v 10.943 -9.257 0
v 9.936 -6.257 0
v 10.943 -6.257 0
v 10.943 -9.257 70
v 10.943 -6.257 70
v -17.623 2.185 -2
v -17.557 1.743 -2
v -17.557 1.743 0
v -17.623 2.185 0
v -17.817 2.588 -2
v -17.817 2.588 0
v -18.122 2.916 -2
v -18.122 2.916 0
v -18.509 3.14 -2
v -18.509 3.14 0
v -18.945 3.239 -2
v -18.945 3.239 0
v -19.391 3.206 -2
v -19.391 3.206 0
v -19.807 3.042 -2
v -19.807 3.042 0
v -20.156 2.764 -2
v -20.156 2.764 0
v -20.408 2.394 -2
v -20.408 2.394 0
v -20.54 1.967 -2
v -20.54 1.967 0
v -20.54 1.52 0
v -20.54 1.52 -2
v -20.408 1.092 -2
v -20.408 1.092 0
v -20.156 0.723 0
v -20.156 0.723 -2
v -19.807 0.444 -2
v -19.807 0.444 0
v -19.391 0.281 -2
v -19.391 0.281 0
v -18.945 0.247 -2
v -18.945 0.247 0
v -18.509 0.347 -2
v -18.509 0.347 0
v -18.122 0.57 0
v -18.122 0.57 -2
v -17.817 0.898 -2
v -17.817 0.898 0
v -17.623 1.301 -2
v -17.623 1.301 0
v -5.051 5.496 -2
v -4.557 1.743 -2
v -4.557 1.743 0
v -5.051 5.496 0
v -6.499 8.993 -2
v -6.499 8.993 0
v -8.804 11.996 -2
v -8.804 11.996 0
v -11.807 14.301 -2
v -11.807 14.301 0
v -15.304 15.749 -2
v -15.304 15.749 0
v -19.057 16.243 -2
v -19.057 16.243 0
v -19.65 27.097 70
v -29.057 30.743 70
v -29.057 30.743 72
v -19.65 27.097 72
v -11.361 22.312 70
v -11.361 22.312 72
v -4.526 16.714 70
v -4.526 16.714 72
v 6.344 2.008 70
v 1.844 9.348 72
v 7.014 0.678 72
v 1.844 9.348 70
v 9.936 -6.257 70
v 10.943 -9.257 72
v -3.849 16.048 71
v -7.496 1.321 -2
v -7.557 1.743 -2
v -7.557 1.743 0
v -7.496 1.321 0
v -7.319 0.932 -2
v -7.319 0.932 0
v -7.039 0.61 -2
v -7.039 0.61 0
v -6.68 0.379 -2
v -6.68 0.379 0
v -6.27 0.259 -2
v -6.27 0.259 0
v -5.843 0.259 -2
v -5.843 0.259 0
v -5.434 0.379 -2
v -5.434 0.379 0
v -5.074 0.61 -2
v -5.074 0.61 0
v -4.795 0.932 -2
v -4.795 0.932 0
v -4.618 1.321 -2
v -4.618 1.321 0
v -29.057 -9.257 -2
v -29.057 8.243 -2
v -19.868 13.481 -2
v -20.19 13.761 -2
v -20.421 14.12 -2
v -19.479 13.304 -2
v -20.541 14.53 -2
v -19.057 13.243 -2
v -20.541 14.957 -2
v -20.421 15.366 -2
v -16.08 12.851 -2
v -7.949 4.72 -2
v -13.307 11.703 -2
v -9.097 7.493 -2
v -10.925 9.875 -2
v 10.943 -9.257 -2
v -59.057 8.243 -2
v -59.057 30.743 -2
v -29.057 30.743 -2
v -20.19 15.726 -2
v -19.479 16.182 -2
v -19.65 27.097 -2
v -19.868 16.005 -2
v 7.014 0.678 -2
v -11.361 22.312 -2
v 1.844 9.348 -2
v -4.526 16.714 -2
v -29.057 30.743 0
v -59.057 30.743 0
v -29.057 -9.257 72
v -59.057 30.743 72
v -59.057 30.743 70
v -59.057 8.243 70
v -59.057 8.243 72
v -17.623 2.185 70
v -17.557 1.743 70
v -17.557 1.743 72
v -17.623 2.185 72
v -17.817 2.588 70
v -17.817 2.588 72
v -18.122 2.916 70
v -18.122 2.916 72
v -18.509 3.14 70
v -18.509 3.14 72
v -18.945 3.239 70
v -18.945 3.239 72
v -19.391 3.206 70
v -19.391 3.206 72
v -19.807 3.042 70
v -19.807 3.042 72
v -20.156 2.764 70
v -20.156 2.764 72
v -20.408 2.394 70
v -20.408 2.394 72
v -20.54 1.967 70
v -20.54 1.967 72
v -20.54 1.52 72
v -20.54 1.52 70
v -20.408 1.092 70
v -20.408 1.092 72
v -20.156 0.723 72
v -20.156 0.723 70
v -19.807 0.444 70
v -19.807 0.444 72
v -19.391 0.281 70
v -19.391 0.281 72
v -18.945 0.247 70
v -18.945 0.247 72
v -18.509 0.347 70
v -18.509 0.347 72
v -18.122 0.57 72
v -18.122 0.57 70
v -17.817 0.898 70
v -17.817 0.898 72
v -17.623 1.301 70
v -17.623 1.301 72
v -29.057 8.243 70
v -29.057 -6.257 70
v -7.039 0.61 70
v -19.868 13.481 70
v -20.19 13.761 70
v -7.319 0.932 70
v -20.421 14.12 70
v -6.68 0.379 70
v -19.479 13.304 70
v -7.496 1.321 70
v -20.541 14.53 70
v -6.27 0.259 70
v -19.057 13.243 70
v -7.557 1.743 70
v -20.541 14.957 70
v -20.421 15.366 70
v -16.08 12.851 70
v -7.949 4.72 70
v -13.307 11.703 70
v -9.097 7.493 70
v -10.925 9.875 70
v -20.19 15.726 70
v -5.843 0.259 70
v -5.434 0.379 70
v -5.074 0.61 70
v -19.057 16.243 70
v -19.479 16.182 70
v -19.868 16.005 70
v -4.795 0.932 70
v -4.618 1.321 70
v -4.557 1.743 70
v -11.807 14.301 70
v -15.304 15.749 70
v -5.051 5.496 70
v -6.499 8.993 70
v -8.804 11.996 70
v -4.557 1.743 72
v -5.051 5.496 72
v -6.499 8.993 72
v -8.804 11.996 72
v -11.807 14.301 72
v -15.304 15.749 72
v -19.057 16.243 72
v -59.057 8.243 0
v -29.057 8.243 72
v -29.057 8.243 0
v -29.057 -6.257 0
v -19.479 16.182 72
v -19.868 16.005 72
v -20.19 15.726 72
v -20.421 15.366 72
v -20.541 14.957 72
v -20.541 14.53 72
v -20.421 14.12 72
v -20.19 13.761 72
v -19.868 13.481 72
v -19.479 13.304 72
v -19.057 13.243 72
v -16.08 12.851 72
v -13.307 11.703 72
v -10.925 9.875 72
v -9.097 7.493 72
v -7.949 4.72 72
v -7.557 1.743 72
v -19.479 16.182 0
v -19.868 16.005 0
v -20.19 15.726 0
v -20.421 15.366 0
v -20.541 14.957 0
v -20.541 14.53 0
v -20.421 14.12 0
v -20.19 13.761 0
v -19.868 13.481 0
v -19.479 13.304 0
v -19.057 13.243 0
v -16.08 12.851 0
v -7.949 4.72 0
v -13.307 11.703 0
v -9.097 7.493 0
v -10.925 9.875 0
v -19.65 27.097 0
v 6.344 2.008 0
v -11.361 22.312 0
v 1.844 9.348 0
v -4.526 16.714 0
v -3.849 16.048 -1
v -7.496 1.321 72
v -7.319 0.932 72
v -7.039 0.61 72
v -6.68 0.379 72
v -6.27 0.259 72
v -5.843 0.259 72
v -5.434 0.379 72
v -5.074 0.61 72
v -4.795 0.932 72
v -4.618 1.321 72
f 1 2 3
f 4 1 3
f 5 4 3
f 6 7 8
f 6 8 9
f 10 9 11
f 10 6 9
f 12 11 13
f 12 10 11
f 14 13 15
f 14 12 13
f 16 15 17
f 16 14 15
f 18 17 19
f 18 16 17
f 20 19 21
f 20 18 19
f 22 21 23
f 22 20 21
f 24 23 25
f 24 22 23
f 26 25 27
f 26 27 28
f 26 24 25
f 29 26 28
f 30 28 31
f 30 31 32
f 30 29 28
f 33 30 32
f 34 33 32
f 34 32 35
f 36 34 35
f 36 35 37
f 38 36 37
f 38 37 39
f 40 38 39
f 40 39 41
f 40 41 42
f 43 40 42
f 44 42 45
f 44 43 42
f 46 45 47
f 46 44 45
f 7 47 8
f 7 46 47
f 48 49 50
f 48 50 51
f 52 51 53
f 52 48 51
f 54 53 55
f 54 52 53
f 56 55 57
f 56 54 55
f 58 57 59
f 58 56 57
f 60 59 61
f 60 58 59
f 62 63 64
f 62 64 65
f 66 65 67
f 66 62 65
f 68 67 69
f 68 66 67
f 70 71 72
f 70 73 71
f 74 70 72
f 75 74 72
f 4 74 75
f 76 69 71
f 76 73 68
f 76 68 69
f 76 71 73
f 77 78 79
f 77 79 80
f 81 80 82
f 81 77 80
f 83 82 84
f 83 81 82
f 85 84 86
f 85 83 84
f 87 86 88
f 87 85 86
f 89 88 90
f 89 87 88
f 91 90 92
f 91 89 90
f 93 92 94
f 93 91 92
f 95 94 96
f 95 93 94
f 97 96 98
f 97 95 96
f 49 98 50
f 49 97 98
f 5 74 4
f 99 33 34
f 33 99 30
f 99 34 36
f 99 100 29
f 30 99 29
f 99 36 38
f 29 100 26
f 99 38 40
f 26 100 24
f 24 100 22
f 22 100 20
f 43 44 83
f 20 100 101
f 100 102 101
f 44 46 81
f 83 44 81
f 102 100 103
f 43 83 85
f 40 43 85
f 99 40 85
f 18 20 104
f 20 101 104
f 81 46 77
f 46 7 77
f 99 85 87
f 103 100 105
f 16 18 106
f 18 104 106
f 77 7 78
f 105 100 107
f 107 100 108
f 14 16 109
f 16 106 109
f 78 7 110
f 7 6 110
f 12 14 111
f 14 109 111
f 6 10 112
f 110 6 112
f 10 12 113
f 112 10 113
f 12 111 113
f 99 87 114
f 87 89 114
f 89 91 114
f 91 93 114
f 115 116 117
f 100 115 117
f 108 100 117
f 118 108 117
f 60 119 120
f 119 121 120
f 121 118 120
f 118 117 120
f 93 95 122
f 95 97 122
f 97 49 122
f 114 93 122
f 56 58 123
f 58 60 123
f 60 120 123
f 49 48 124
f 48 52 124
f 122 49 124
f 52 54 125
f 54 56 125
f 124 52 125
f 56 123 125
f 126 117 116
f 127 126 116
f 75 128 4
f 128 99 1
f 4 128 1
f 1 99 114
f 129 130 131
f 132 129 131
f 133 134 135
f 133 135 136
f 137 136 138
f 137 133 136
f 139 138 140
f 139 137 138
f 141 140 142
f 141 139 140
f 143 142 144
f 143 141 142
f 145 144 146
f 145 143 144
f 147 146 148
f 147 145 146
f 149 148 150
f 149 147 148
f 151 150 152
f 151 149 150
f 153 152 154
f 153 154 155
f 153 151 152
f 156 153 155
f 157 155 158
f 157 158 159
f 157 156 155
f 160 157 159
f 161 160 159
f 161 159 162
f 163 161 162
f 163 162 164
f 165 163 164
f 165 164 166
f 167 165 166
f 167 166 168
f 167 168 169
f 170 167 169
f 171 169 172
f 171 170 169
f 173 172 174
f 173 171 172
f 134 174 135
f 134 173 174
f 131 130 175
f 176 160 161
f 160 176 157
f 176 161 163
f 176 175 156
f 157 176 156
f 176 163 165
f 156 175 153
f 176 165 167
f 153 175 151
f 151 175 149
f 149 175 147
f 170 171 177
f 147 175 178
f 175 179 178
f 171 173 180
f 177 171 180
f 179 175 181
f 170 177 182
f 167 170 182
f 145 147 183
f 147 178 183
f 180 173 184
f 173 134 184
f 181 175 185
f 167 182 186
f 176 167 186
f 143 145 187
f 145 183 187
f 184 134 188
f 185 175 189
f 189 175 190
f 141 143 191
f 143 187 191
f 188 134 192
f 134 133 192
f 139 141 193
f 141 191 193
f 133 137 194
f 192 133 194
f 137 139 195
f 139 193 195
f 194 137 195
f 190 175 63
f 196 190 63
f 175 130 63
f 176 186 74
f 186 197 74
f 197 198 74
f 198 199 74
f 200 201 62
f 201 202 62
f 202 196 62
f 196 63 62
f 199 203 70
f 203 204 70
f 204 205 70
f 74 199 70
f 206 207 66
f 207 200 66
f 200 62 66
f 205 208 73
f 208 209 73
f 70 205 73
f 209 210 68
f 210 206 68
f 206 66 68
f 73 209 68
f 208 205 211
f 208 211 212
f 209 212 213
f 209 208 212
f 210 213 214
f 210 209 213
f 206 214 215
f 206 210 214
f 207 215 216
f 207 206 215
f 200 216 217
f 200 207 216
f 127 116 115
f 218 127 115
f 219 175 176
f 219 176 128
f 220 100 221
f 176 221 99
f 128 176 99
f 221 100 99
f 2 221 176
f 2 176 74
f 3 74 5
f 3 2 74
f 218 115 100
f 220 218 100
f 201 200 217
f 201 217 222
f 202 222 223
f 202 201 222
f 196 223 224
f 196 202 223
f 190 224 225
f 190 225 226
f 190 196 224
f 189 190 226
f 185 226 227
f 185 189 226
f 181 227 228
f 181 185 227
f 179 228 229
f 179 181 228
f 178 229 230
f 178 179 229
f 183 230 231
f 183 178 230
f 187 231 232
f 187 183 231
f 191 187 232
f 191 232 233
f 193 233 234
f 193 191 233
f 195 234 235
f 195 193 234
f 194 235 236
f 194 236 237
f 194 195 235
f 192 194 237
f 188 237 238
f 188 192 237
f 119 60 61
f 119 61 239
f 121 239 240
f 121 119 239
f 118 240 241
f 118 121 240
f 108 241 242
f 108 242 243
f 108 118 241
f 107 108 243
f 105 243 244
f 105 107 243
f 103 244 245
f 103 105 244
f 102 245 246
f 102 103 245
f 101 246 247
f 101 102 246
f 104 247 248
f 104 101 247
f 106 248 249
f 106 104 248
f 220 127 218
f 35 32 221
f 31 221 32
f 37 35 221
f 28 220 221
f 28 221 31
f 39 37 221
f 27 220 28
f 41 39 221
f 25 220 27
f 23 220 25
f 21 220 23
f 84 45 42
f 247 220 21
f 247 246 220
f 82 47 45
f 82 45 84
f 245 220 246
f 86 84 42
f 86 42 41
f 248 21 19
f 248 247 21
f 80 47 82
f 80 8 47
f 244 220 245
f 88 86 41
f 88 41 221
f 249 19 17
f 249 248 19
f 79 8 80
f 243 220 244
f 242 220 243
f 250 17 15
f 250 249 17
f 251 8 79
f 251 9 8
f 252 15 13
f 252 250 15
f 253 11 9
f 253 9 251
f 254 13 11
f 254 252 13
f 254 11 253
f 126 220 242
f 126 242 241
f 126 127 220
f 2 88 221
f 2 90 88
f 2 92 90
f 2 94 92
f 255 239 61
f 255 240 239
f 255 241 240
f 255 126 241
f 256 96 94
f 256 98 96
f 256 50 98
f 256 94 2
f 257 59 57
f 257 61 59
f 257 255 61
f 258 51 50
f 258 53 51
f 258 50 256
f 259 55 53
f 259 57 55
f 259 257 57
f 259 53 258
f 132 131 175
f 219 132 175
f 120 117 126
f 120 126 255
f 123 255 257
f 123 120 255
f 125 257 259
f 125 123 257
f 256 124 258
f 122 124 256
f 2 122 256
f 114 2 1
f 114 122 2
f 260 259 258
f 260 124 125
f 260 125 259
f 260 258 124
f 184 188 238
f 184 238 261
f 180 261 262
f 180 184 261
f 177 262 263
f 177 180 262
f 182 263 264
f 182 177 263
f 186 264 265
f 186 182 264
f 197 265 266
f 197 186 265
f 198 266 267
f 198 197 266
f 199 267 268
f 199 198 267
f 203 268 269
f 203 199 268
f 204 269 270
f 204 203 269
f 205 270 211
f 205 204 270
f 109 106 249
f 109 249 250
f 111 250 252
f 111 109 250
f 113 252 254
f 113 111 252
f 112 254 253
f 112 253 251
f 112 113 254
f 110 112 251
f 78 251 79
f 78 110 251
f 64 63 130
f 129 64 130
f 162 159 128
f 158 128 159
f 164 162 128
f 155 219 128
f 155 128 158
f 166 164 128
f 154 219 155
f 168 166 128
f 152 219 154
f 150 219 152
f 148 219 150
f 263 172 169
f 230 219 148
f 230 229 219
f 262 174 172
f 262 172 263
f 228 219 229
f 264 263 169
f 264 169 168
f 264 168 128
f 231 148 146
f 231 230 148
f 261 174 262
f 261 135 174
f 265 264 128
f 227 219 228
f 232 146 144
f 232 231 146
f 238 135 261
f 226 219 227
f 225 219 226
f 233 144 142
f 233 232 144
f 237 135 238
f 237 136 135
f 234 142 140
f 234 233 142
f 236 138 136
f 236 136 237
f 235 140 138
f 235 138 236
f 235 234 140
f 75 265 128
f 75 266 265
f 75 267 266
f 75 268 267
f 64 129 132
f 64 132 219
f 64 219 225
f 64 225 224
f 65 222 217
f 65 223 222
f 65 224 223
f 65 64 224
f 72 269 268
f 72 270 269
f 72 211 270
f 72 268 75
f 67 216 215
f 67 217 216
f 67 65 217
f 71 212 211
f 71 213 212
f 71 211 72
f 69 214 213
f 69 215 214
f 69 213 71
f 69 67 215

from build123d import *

# Parameters (mm, degrees)
ESQUISSE1_W                = 40
ESQUISSE1_H                = 3
BOSS_EXTRU_2_DEPTH         = 70
ESQUISSE3_R                = 1.5
BOSS_EXTRU_3_DEPTH         = 2
R_P_TITION_LIN_AIRE1_COUNT = 2
R_P_TITION_LIN_AIRE1_PITCH = 72


with BuildPart() as part:
    # Esquisse1 → Boss.-Extru.2 (new body)
    with BuildSketch(Plane.XY):
        with Locations((-9.056759605, -7.756756757)):
            Rectangle(ESQUISSE1_W, ESQUISSE1_H)
    extrude(amount=BOSS_EXTRU_2_DEPTH)

    # Esquisse3 → Boss.-Extru.3 (add)
    with BuildSketch(Plane.XY.offset(70)):
        with BuildLine():
            Line((-29.056759605, -9.256756757), (10.943240395, -9.256756757))
            add(Edge.make_bspline(
                [(-29.056759605, 30.743243243), (1.359242572, 21.353115069), (10.943240395, -9.256756757)],
                knots=[0, 0, 0, 1, 1, 1], degree=2))
            Line((-29.056759605, 30.743243243), (-59.056759605, 30.743243243))
            Line((-59.056759605, 30.743243243), (-59.056759605, 8.243243243))
            Line((-59.056759605, 8.243243243), (-29.056759605, 8.243243243))
            Line((-29.056759605, 8.243243243), (-29.056759605, -9.256756757))
        make_face()
        with Locations((-19.056759605, 1.743243243)):
            Circle(ESQUISSE3_R, mode=Mode.SUBTRACT)
        with BuildLine():
            ThreePointArc((-4.556759605, 1.743243243), (-8.803711277, 11.99629157), (-19.056759605, 16.243243243))
            ThreePointArc((-19.056759605, 16.243243243), (-20.556759605, 14.743243243), (-19.056759605, 13.243243243))
            ThreePointArc((-19.056759605, 13.243243243), (-10.925031621, 9.874971227), (-7.556759605, 1.743243243))
            ThreePointArc((-7.556759605, 1.743243243), (-6.056759605, 0.243243243), (-4.556759605, 1.743243243))
        make_face(mode=Mode.SUBTRACT)
    boss_extru_3 = extrude(amount=BOSS_EXTRU_3_DEPTH)

    # Répétition linéaire1: Boss.-Extru.3 ×2
    with Locations(*[(0, 0, -i * R_P_TITION_LIN_AIRE1_PITCH) for i in range(1, R_P_TITION_LIN_AIRE1_COUNT)]):
        add(boss_extru_3)


solid = part.part
